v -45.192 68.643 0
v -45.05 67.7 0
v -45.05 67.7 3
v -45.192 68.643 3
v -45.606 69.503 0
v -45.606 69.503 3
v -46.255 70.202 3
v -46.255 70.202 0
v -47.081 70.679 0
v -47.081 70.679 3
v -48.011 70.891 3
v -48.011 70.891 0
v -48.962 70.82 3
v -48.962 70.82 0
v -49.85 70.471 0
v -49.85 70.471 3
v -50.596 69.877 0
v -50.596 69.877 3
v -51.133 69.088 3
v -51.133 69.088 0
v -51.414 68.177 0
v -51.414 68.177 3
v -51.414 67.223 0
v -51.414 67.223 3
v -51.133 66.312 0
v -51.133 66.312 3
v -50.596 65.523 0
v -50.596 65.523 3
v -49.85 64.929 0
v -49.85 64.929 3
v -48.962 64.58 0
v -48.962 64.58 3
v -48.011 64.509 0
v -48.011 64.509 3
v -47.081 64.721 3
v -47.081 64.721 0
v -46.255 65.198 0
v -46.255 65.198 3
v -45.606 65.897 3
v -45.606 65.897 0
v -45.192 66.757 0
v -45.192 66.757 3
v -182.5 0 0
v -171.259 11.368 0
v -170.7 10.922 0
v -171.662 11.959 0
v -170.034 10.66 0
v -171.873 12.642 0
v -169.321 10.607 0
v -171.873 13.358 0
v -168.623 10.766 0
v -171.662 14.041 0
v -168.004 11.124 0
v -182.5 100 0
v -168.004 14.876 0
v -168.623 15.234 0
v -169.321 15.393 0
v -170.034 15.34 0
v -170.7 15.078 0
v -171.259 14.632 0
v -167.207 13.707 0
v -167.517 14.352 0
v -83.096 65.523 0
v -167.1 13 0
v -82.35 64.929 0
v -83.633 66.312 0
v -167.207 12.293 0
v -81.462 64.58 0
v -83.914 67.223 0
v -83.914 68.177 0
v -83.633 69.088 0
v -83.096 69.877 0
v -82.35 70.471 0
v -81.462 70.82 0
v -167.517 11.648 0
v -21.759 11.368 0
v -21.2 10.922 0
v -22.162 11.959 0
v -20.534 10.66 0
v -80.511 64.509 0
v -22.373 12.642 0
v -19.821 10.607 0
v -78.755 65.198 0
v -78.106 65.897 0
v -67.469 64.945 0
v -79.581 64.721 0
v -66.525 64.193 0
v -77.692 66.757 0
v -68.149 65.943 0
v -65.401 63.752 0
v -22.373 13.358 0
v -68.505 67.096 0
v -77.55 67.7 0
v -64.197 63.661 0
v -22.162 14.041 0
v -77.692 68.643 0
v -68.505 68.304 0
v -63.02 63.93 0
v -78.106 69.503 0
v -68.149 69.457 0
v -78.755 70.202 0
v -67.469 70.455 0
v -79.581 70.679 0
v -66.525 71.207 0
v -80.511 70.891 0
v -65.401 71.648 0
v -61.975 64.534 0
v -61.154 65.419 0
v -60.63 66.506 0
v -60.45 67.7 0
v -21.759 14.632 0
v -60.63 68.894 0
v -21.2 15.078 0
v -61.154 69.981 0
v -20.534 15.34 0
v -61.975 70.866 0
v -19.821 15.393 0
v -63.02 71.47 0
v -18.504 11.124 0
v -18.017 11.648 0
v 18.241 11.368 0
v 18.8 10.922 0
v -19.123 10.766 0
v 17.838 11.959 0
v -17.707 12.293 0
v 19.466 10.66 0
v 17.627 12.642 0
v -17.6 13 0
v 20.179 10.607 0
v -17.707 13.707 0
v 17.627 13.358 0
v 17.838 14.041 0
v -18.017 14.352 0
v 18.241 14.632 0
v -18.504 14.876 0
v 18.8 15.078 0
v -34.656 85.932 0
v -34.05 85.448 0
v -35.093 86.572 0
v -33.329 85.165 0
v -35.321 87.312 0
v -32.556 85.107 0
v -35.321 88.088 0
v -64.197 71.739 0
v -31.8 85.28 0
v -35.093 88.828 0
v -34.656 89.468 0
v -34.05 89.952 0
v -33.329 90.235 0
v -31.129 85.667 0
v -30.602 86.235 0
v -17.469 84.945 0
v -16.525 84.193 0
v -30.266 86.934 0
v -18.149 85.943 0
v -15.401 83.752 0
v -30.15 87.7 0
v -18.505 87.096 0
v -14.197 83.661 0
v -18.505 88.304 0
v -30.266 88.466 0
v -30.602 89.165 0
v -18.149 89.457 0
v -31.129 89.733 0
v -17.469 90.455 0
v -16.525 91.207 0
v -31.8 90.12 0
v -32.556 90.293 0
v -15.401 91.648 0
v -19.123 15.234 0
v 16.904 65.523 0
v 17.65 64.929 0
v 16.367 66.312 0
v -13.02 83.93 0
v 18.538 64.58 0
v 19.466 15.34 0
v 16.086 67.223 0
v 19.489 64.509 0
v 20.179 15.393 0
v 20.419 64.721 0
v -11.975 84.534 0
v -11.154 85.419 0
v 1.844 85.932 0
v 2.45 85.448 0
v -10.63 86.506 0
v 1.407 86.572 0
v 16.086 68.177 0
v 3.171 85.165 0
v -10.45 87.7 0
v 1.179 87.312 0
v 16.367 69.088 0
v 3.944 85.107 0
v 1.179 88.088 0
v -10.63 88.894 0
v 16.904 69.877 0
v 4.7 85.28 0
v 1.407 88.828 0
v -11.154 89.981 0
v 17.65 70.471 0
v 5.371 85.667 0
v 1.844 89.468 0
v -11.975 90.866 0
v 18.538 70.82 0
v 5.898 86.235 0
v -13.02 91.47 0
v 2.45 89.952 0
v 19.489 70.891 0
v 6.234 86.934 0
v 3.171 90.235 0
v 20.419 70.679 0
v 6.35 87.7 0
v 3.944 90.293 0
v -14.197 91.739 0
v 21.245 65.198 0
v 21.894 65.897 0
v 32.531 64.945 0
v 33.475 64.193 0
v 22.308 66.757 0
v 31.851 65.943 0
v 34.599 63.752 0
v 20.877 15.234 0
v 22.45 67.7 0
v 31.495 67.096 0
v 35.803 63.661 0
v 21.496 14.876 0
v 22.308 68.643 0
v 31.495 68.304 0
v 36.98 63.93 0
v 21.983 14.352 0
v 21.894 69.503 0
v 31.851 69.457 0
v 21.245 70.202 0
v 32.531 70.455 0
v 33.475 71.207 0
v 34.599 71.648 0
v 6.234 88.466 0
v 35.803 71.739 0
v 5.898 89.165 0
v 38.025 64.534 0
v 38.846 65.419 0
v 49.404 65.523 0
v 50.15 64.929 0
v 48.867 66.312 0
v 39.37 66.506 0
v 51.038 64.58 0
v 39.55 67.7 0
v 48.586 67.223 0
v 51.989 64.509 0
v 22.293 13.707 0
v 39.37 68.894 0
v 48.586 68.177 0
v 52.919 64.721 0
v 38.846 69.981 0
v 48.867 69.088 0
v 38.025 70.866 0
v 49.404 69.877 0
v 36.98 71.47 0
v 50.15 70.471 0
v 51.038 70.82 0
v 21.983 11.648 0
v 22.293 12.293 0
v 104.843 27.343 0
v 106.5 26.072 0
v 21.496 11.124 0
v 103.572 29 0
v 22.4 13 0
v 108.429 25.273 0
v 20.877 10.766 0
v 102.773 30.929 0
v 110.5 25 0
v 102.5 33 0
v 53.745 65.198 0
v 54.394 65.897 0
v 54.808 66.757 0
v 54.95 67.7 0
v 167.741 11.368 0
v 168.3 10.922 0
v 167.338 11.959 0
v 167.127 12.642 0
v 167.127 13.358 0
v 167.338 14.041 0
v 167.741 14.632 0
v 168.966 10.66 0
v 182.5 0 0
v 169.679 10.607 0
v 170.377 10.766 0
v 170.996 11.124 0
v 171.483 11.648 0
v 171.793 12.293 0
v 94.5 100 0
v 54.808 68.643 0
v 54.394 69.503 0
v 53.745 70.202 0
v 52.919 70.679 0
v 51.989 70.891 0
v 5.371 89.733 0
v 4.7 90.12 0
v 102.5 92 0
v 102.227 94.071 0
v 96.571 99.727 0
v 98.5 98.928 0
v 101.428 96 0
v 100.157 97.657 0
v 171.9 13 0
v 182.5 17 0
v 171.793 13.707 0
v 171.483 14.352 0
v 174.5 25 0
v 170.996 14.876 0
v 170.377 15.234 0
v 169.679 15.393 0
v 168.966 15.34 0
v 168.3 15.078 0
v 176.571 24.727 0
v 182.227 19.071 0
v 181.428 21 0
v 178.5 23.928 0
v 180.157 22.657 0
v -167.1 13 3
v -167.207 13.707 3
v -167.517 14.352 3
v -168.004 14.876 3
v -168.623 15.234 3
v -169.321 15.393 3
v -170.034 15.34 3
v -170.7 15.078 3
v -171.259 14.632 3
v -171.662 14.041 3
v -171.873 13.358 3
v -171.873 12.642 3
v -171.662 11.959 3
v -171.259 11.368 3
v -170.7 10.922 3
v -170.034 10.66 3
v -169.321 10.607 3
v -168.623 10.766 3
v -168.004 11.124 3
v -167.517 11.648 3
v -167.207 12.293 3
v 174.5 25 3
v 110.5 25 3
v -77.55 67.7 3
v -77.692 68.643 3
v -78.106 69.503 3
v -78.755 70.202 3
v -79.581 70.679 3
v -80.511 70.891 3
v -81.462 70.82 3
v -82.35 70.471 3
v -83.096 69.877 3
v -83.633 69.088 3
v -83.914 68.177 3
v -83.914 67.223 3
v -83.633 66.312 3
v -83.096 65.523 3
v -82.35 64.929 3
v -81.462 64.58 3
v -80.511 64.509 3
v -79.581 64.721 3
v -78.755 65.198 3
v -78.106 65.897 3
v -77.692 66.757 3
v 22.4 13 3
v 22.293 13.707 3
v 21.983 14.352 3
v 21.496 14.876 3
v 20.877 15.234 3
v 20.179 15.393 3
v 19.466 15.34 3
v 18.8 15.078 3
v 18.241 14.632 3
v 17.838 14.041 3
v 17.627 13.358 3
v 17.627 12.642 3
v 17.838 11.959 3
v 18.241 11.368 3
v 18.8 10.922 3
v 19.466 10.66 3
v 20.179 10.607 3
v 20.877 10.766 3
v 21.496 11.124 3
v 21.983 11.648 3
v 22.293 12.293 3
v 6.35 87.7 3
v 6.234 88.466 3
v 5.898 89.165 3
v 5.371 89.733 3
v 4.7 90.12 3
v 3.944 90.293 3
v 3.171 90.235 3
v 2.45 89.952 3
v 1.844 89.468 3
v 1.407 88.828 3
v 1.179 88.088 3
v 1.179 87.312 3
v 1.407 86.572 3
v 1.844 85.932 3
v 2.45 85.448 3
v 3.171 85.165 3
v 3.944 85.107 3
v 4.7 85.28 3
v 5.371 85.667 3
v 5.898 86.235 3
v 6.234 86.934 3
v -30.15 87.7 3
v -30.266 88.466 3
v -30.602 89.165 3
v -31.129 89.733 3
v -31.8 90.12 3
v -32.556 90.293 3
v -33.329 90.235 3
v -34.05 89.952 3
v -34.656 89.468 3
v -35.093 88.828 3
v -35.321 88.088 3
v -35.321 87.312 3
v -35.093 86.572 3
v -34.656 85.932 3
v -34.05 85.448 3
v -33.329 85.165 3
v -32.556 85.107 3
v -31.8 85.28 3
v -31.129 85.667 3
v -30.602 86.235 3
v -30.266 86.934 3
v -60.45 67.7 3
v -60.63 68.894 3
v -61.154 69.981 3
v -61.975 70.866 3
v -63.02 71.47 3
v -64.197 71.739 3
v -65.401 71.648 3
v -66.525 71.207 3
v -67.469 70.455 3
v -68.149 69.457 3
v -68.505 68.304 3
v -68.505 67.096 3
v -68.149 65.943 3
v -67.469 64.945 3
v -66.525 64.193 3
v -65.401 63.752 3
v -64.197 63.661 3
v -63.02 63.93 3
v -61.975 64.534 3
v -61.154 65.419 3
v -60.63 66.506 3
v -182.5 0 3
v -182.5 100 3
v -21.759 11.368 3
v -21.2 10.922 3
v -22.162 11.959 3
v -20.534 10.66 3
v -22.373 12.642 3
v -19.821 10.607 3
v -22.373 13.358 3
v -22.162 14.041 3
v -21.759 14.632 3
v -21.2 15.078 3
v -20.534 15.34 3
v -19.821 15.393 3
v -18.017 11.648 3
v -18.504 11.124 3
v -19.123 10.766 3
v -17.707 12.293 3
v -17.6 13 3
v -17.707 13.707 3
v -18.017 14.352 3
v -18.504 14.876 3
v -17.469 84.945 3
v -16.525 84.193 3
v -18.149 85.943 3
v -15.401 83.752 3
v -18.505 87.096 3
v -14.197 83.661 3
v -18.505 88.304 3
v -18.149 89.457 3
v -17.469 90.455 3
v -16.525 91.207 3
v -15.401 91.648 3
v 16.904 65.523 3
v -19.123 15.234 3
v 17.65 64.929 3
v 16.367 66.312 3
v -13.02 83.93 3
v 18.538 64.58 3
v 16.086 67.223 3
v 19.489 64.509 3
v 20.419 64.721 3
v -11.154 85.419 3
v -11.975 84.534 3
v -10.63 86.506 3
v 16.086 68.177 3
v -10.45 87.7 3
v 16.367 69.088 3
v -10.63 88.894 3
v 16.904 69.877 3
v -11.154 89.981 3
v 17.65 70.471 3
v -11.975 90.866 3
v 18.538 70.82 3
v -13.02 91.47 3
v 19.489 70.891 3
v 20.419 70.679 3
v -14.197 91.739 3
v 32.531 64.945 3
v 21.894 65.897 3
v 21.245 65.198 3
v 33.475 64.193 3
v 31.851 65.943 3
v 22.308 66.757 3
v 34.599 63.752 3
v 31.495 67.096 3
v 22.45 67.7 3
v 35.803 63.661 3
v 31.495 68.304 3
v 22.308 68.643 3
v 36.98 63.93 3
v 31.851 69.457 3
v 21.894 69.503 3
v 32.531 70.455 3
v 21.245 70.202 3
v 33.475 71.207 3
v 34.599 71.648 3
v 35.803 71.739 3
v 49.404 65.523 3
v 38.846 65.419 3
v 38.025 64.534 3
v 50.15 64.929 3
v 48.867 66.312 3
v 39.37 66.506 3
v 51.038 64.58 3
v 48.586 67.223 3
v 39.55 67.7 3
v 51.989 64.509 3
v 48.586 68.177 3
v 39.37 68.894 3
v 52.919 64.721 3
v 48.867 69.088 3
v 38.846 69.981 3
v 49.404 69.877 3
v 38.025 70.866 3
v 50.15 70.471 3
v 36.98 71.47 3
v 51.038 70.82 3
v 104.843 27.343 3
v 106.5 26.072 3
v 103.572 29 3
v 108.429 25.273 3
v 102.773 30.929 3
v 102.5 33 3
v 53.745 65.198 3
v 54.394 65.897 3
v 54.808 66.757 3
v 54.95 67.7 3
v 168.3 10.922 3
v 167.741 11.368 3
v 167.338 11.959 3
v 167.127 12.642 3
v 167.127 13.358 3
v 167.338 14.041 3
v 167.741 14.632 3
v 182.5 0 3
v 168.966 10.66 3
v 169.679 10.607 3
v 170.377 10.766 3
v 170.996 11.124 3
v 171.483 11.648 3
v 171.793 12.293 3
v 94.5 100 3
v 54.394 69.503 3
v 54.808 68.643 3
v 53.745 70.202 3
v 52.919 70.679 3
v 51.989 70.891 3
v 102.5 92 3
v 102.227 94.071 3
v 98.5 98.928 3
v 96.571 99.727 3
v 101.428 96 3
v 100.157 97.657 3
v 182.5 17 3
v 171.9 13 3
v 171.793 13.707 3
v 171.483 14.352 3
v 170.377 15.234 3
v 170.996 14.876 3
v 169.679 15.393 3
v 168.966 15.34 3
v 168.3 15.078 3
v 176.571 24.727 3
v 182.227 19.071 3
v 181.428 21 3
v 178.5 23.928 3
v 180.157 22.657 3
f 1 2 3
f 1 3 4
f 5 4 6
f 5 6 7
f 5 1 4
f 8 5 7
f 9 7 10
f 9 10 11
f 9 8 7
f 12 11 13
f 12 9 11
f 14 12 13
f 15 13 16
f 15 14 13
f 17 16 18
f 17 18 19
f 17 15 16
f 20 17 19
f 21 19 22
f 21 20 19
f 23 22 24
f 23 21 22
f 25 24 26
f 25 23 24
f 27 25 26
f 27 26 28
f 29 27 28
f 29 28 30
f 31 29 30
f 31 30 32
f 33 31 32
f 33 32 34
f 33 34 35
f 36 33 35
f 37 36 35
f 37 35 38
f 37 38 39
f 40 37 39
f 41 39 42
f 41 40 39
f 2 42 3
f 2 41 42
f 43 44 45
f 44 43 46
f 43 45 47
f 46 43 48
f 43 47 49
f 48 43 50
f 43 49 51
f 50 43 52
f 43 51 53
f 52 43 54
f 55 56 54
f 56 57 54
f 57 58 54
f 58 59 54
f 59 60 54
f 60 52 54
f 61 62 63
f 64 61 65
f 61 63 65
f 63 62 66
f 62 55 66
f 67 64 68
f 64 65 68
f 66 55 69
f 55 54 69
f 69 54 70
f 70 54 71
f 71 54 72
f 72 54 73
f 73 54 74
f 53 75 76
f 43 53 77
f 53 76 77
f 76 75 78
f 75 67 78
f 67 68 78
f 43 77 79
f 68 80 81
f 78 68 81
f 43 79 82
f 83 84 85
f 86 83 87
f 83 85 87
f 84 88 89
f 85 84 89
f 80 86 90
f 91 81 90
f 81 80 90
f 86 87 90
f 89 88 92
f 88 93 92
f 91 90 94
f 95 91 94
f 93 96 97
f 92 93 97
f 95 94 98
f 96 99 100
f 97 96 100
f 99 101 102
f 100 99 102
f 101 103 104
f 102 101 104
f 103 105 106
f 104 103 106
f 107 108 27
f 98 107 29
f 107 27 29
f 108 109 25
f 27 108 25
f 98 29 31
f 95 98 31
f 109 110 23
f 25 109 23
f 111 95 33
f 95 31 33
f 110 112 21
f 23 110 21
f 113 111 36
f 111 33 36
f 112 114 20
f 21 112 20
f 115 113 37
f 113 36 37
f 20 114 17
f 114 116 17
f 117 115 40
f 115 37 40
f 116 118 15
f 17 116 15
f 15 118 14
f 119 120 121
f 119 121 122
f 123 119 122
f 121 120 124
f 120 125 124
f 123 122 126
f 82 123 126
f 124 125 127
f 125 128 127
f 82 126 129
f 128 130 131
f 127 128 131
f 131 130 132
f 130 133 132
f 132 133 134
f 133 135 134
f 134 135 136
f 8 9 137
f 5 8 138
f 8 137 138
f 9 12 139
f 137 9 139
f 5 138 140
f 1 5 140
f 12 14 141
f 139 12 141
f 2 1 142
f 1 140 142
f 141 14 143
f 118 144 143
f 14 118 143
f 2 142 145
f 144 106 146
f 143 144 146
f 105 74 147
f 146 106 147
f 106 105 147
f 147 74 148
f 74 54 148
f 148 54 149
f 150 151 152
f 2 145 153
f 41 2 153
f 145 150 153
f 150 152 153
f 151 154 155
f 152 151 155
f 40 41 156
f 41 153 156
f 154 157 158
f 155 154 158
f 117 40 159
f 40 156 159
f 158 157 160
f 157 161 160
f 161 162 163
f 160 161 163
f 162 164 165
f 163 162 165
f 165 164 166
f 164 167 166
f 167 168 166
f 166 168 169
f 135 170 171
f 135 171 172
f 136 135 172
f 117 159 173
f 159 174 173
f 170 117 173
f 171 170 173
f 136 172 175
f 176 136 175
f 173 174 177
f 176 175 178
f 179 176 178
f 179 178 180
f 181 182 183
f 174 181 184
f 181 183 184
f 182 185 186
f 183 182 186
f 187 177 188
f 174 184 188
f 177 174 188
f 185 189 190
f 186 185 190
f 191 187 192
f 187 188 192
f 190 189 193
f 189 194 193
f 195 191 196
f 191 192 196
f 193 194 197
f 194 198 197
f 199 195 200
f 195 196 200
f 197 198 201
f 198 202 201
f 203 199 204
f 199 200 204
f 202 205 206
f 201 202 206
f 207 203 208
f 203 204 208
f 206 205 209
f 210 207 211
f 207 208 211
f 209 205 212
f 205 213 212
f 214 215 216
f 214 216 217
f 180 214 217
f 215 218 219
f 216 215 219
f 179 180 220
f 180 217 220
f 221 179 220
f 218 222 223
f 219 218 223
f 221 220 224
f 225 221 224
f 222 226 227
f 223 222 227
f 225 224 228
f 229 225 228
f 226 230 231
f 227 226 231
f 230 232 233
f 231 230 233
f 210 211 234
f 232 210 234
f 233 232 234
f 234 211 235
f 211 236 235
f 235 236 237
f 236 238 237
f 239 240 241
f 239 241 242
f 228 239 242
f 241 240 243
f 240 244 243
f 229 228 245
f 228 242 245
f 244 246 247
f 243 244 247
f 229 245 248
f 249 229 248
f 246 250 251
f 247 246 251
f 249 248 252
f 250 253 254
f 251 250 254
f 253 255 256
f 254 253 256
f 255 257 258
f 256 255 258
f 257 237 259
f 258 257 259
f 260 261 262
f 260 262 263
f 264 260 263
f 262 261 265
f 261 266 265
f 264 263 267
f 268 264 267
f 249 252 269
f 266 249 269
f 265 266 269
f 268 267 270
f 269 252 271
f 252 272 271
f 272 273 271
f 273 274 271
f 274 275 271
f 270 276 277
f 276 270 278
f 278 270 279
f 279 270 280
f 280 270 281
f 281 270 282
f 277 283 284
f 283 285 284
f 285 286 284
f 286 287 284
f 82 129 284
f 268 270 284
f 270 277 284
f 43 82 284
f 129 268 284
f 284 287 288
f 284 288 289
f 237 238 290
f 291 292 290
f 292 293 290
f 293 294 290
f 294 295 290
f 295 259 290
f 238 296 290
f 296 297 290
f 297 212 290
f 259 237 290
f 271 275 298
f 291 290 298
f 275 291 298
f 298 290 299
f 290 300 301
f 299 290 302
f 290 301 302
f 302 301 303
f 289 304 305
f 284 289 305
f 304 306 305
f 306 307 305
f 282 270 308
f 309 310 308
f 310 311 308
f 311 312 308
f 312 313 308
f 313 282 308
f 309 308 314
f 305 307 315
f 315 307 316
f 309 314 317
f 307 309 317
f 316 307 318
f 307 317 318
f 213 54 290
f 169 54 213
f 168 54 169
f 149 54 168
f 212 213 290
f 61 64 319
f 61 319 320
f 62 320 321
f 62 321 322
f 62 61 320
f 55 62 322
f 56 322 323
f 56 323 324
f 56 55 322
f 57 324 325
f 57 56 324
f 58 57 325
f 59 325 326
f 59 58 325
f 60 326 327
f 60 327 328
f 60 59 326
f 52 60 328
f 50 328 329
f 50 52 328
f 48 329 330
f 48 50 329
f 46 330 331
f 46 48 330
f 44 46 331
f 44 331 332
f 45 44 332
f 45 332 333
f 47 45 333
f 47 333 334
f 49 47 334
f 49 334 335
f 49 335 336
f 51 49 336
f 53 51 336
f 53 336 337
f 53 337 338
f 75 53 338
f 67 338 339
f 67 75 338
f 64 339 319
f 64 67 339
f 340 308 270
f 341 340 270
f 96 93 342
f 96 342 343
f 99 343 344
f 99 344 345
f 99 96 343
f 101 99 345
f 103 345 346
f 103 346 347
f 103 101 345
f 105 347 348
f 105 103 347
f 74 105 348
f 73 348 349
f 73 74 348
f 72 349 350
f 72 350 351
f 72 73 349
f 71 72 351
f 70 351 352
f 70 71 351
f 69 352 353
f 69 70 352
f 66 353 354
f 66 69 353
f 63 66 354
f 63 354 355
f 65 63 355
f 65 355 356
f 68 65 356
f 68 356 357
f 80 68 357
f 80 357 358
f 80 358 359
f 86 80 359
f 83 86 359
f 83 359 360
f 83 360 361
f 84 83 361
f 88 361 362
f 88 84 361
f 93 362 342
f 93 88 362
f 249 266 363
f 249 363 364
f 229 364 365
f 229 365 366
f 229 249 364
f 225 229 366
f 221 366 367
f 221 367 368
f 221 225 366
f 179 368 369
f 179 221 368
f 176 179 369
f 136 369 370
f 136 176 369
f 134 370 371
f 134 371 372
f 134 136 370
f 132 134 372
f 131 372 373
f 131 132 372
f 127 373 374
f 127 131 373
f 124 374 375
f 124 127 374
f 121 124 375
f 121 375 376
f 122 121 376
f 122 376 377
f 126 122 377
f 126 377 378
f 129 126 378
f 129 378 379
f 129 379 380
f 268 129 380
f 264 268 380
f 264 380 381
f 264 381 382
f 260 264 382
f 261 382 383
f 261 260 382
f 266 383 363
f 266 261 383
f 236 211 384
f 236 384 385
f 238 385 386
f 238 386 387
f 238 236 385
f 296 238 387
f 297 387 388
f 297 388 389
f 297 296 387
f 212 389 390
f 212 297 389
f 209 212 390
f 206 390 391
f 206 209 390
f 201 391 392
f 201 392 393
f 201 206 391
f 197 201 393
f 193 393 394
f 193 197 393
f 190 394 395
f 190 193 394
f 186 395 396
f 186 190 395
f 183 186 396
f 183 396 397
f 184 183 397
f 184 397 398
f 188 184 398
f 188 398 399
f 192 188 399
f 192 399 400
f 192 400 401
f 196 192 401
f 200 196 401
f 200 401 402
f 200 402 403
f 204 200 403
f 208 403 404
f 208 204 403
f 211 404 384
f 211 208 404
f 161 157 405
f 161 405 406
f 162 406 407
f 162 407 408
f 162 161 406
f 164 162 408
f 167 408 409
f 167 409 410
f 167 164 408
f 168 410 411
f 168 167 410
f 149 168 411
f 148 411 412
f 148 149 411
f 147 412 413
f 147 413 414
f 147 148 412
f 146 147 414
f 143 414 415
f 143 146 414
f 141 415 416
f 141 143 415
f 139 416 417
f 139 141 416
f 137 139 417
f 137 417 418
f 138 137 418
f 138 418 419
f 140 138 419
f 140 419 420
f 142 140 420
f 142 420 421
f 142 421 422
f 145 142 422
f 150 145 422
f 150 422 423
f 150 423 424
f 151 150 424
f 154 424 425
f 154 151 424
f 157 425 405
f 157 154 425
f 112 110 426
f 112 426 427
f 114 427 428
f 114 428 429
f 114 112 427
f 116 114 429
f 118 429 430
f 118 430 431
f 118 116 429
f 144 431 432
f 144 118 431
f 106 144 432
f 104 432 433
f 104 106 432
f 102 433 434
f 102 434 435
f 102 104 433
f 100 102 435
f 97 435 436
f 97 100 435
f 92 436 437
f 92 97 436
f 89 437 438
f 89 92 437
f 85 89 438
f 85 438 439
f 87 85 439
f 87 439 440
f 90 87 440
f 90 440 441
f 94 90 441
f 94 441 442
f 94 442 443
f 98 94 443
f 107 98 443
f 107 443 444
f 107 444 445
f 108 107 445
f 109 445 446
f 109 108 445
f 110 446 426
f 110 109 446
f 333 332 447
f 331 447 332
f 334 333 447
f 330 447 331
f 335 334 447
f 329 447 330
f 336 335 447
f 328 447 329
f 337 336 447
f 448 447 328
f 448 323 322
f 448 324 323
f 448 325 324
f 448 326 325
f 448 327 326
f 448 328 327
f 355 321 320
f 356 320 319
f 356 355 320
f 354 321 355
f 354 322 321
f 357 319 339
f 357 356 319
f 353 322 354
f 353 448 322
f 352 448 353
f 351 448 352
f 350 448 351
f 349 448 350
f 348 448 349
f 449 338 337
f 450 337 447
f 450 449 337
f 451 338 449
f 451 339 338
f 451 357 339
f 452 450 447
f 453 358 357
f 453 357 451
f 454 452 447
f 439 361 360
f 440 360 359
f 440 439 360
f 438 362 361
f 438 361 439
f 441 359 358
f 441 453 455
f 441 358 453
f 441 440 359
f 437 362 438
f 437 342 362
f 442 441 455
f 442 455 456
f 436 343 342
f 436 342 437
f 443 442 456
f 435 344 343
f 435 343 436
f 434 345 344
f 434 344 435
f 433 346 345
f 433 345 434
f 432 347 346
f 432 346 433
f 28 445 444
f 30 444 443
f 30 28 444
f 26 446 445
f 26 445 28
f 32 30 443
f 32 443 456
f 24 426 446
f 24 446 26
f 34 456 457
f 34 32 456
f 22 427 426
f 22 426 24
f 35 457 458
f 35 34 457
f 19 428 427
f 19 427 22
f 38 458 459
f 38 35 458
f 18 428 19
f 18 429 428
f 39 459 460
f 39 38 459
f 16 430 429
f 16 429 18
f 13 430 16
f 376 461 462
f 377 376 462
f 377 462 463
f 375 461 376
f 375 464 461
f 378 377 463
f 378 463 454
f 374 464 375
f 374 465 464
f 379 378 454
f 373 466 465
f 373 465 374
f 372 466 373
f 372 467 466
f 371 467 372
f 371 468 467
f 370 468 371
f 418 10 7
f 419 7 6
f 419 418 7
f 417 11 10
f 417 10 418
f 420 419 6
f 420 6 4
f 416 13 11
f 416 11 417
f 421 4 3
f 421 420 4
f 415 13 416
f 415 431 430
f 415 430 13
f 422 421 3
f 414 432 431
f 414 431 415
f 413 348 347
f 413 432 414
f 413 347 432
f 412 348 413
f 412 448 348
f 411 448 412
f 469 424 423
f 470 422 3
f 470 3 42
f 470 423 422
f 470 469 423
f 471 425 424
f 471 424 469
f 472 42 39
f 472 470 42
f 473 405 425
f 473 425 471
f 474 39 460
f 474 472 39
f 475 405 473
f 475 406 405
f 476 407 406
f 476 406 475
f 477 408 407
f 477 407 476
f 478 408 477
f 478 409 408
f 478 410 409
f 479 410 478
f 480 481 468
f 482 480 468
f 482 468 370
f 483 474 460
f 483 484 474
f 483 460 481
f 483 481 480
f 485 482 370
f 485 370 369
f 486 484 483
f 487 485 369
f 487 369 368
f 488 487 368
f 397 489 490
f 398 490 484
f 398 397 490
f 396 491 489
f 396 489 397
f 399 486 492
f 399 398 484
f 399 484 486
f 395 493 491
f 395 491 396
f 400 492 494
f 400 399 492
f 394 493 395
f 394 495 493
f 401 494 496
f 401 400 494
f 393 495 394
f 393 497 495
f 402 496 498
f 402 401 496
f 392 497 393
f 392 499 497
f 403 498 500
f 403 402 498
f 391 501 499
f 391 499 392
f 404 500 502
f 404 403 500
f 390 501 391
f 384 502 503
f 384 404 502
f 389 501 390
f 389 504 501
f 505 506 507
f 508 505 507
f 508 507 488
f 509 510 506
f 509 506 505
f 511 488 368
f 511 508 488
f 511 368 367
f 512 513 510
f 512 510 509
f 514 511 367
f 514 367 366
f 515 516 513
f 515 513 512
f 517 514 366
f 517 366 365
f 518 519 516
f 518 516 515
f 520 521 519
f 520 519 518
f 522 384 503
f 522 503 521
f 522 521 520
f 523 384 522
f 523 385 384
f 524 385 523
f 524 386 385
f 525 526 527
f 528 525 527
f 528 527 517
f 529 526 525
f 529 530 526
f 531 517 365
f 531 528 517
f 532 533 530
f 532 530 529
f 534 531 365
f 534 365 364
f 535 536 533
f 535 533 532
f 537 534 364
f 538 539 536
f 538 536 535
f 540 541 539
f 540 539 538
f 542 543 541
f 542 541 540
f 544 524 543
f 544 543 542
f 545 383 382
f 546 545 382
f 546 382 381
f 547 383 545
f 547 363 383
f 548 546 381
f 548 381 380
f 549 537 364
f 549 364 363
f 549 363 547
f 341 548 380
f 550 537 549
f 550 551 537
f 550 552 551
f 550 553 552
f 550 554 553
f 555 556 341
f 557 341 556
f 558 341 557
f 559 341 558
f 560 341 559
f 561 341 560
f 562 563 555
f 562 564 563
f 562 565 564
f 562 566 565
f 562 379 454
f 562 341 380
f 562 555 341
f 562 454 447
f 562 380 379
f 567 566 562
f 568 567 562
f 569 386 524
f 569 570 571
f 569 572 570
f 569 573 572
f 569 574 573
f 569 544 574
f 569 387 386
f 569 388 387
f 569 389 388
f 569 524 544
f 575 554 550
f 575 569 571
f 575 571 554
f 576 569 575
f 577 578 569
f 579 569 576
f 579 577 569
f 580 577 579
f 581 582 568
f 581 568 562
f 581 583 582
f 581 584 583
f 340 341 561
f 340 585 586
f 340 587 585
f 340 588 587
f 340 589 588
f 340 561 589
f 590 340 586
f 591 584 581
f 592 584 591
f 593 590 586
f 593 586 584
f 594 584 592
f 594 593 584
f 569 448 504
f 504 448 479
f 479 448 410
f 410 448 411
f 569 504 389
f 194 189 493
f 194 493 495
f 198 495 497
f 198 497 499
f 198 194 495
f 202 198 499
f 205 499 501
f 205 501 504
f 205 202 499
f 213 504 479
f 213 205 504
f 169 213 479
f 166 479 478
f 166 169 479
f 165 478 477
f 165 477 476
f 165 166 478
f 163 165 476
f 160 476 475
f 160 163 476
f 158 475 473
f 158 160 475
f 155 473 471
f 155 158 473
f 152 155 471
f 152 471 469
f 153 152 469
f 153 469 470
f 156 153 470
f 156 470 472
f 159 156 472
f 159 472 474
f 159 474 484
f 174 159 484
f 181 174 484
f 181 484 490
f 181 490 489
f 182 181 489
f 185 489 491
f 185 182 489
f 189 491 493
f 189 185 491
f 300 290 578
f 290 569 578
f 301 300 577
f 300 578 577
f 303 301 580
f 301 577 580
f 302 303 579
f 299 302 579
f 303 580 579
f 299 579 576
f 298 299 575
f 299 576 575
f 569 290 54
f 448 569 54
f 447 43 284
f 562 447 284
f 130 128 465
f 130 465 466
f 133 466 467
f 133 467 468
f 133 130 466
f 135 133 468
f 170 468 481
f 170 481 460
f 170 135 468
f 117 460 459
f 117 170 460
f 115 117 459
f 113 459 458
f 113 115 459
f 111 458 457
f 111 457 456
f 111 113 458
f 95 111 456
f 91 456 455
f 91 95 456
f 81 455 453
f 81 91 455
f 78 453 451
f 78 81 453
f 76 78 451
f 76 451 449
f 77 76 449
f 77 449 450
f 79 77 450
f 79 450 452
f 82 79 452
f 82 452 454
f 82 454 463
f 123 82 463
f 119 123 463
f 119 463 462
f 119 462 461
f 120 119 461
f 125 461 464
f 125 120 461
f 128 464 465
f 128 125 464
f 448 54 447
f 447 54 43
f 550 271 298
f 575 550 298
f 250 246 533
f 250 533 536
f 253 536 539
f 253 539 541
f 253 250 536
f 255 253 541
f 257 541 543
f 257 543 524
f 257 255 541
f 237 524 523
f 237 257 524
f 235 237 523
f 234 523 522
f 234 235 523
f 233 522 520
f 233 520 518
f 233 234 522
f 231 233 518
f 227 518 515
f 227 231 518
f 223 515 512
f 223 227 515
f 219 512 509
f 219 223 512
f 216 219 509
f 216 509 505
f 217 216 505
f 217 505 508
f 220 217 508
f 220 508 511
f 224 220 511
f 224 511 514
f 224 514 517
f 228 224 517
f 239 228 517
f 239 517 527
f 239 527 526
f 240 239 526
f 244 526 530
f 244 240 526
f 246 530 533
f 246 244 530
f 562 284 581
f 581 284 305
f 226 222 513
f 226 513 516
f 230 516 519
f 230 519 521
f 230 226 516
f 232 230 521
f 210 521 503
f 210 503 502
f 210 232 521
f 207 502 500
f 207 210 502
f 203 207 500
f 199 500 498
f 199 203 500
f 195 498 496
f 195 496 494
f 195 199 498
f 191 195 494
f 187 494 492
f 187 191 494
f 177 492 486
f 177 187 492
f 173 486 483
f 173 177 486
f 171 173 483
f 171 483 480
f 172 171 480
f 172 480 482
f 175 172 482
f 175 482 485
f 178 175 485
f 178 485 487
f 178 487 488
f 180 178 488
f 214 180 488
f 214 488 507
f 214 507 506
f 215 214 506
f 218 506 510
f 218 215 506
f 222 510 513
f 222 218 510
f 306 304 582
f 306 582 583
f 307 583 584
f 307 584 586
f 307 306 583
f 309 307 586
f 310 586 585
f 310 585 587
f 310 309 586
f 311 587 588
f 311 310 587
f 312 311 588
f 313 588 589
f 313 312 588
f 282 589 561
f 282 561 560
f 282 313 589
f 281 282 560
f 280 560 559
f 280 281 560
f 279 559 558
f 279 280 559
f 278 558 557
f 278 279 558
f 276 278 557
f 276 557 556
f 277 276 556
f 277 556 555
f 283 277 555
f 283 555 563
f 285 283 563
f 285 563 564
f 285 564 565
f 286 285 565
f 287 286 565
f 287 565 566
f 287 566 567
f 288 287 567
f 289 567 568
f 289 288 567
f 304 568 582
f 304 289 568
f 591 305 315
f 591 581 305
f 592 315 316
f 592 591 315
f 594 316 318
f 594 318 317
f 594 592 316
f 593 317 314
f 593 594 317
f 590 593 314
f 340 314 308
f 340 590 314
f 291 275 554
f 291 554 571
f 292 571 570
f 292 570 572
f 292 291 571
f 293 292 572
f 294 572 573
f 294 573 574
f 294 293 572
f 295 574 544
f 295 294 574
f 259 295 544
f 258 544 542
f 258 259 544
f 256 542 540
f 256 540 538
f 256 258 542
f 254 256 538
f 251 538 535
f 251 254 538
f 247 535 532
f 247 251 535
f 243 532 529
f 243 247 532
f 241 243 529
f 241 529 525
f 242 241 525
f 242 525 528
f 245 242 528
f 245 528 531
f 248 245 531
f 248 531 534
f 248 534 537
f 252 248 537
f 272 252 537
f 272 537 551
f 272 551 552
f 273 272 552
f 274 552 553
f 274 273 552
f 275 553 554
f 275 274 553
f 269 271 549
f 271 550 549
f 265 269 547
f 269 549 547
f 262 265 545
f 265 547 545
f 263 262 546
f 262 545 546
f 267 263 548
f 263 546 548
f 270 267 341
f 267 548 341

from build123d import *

# Parameters (mm, degrees)
SKETCH_R   = 4.05
SKETCH_R_2 = 2.6
SKETCH_R_3 = 3.2
SKETCH_R_4 = 2.4
PAD_DEPTH  = 3
FILLET_R   = 8


with BuildPart() as part:
    # Sketch → Pad (new body)
    with BuildSketch(Plane.XY):
        Polygon((-182.5, 100), (-182.5, 0), (182.5, 0), (182.5, 25), (102.5, 25), (102.5, 100), align=None)
        with Locations((-14.5, 87.7)):
            Circle(SKETCH_R, mode=Mode.SUBTRACT)
        with Locations((-64.5, 67.7)):
            Circle(SKETCH_R, mode=Mode.SUBTRACT)
        with Locations((35.5, 67.7)):
            Circle(SKETCH_R, mode=Mode.SUBTRACT)
        with Locations((-32.75, 87.7)):
            Circle(SKETCH_R_2, mode=Mode.SUBTRACT)
        with Locations((3.75, 87.7)):
            Circle(SKETCH_R_2, mode=Mode.SUBTRACT)
        with Locations((19.25, 67.7)):
            Circle(SKETCH_R_3, mode=Mode.SUBTRACT)
        with Locations((51.75, 67.7)):
            Circle(SKETCH_R_3, mode=Mode.SUBTRACT)
        with Locations((-80.75, 67.7)):
            Circle(SKETCH_R_3, mode=Mode.SUBTRACT)
        with Locations((-48.25, 67.7)):
            Circle(SKETCH_R_3, mode=Mode.SUBTRACT)
        with Locations((-169.5, 13)):
            Circle(SKETCH_R_4, mode=Mode.SUBTRACT)
        with Locations((169.5, 13)):
            Circle(SKETCH_R_4, mode=Mode.SUBTRACT)
        with Locations((20, 13)):
            Circle(SKETCH_R_4, mode=Mode.SUBTRACT)
        with Locations((-20, 13)):
            Circle(SKETCH_R_4, mode=Mode.SUBTRACT)
    extrude(amount=PAD_DEPTH)

    # Fillet
    fillet_edges = [part.edges().sort_by_distance(p)[0] for p in [
        (102.5, 100, 1.5),
        (102.5, 25, 1.5),
        (182.5, 25, 1.5),
    ]]
    fillet(fillet_edges, radius=FILLET_R)


solid = part.part
